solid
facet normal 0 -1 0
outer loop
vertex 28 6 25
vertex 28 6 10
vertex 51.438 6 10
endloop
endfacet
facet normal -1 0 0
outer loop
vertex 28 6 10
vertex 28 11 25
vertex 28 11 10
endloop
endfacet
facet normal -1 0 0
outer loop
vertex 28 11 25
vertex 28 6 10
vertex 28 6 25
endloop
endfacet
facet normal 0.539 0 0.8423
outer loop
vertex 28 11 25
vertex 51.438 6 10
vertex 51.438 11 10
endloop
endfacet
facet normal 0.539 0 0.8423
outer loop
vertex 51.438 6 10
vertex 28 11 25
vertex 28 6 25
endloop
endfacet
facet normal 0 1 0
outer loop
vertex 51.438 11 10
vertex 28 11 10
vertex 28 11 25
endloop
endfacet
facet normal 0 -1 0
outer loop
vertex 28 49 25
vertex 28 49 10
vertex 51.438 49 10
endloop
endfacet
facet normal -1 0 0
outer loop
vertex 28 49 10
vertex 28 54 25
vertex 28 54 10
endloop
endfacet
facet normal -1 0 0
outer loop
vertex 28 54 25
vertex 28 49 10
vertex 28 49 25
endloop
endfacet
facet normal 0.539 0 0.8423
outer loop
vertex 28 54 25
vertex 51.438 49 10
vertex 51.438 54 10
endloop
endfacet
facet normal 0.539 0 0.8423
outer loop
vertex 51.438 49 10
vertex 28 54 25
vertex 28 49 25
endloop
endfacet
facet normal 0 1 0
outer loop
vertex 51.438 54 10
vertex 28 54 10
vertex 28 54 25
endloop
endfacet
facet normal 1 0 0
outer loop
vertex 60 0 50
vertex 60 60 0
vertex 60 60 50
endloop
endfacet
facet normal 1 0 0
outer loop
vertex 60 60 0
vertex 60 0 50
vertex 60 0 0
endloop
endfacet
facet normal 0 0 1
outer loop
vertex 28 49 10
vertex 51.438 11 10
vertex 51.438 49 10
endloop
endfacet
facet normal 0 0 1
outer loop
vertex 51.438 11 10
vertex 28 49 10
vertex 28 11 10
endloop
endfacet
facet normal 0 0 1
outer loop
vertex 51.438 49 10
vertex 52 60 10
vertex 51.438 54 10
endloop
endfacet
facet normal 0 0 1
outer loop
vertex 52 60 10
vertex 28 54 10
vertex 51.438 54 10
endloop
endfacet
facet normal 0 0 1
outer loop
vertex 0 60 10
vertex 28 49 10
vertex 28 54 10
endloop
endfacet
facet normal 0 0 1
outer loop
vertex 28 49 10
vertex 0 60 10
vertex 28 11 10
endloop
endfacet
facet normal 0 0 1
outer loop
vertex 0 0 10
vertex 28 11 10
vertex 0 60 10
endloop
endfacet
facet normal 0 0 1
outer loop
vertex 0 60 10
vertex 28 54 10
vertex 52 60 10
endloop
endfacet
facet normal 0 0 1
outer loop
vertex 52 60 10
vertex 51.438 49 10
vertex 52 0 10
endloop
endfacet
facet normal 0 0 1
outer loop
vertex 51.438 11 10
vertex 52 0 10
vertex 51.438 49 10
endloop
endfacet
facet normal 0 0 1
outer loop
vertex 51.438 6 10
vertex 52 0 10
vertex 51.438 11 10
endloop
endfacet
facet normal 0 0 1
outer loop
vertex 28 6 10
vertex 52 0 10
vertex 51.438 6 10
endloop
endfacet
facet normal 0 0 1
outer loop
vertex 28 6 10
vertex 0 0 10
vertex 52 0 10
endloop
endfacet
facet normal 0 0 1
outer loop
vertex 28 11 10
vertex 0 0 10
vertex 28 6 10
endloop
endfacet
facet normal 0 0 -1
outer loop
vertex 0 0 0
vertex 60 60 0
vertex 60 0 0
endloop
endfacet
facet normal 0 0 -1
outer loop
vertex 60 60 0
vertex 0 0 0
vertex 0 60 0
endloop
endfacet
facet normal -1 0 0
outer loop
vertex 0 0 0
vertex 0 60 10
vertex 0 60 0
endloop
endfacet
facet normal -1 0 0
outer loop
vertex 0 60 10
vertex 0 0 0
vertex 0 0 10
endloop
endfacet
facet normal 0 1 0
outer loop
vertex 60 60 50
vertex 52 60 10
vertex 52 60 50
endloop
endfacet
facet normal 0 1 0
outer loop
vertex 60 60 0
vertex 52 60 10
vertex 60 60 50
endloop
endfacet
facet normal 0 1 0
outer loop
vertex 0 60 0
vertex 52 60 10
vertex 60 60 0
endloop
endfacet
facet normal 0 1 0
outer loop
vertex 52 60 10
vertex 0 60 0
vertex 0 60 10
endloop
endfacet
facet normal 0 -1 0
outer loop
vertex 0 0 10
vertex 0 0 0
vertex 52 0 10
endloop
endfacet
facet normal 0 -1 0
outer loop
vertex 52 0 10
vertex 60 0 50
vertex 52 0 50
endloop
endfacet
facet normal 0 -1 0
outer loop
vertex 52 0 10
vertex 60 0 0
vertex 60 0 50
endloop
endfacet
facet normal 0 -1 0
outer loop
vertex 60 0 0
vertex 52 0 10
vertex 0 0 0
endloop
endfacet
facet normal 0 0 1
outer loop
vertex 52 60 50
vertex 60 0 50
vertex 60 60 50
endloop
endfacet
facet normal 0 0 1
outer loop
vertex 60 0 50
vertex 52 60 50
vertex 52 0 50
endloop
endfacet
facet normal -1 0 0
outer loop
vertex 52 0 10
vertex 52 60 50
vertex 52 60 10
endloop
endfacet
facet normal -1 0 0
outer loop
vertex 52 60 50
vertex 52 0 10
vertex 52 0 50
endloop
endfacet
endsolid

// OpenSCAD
$fn = 32;

// ----------------------------------------------------------------------
// Rib bracket: 2-gusset L bracket
// ----------------------------------------------------------------------

// --- parameters (mm) ---
base_l = 60;              // foot length, X
base_w = 60;              // foot width, Y
base_t = 10;              // foot thickness
plate_t = 8;              // upright plate thickness
plate_h = 50;             // overall height
gus_l = 24;               // gusset leg along the foot
gus_h = 16;               // gusset height
gus_t = 5;                // gusset thickness
gus_edge = 6;             // gusset margin from the foot edge
n_gus = 2;                // gusset count

gus_pitch = (base_w - 2 * gus_edge - gus_t) / (n_gus - 1);  // gusset pitch

union() {
  cube([base_l, base_w, base_t]);
  translate([base_l - plate_t, 0, base_t - 1])
    cube([plate_t, base_w, plate_h - base_t + 1]);
  for (i = [0 : n_gus - 1])
    translate([base_l - plate_t - gus_l, gus_edge + i * gus_pitch, base_t - 1])
      rotate([-90, 0, 0])
        linear_extrude(height = gus_t)
          polygon(points = [[0, 0], [gus_l + 1, 0], [0, -gus_h]]);
}
